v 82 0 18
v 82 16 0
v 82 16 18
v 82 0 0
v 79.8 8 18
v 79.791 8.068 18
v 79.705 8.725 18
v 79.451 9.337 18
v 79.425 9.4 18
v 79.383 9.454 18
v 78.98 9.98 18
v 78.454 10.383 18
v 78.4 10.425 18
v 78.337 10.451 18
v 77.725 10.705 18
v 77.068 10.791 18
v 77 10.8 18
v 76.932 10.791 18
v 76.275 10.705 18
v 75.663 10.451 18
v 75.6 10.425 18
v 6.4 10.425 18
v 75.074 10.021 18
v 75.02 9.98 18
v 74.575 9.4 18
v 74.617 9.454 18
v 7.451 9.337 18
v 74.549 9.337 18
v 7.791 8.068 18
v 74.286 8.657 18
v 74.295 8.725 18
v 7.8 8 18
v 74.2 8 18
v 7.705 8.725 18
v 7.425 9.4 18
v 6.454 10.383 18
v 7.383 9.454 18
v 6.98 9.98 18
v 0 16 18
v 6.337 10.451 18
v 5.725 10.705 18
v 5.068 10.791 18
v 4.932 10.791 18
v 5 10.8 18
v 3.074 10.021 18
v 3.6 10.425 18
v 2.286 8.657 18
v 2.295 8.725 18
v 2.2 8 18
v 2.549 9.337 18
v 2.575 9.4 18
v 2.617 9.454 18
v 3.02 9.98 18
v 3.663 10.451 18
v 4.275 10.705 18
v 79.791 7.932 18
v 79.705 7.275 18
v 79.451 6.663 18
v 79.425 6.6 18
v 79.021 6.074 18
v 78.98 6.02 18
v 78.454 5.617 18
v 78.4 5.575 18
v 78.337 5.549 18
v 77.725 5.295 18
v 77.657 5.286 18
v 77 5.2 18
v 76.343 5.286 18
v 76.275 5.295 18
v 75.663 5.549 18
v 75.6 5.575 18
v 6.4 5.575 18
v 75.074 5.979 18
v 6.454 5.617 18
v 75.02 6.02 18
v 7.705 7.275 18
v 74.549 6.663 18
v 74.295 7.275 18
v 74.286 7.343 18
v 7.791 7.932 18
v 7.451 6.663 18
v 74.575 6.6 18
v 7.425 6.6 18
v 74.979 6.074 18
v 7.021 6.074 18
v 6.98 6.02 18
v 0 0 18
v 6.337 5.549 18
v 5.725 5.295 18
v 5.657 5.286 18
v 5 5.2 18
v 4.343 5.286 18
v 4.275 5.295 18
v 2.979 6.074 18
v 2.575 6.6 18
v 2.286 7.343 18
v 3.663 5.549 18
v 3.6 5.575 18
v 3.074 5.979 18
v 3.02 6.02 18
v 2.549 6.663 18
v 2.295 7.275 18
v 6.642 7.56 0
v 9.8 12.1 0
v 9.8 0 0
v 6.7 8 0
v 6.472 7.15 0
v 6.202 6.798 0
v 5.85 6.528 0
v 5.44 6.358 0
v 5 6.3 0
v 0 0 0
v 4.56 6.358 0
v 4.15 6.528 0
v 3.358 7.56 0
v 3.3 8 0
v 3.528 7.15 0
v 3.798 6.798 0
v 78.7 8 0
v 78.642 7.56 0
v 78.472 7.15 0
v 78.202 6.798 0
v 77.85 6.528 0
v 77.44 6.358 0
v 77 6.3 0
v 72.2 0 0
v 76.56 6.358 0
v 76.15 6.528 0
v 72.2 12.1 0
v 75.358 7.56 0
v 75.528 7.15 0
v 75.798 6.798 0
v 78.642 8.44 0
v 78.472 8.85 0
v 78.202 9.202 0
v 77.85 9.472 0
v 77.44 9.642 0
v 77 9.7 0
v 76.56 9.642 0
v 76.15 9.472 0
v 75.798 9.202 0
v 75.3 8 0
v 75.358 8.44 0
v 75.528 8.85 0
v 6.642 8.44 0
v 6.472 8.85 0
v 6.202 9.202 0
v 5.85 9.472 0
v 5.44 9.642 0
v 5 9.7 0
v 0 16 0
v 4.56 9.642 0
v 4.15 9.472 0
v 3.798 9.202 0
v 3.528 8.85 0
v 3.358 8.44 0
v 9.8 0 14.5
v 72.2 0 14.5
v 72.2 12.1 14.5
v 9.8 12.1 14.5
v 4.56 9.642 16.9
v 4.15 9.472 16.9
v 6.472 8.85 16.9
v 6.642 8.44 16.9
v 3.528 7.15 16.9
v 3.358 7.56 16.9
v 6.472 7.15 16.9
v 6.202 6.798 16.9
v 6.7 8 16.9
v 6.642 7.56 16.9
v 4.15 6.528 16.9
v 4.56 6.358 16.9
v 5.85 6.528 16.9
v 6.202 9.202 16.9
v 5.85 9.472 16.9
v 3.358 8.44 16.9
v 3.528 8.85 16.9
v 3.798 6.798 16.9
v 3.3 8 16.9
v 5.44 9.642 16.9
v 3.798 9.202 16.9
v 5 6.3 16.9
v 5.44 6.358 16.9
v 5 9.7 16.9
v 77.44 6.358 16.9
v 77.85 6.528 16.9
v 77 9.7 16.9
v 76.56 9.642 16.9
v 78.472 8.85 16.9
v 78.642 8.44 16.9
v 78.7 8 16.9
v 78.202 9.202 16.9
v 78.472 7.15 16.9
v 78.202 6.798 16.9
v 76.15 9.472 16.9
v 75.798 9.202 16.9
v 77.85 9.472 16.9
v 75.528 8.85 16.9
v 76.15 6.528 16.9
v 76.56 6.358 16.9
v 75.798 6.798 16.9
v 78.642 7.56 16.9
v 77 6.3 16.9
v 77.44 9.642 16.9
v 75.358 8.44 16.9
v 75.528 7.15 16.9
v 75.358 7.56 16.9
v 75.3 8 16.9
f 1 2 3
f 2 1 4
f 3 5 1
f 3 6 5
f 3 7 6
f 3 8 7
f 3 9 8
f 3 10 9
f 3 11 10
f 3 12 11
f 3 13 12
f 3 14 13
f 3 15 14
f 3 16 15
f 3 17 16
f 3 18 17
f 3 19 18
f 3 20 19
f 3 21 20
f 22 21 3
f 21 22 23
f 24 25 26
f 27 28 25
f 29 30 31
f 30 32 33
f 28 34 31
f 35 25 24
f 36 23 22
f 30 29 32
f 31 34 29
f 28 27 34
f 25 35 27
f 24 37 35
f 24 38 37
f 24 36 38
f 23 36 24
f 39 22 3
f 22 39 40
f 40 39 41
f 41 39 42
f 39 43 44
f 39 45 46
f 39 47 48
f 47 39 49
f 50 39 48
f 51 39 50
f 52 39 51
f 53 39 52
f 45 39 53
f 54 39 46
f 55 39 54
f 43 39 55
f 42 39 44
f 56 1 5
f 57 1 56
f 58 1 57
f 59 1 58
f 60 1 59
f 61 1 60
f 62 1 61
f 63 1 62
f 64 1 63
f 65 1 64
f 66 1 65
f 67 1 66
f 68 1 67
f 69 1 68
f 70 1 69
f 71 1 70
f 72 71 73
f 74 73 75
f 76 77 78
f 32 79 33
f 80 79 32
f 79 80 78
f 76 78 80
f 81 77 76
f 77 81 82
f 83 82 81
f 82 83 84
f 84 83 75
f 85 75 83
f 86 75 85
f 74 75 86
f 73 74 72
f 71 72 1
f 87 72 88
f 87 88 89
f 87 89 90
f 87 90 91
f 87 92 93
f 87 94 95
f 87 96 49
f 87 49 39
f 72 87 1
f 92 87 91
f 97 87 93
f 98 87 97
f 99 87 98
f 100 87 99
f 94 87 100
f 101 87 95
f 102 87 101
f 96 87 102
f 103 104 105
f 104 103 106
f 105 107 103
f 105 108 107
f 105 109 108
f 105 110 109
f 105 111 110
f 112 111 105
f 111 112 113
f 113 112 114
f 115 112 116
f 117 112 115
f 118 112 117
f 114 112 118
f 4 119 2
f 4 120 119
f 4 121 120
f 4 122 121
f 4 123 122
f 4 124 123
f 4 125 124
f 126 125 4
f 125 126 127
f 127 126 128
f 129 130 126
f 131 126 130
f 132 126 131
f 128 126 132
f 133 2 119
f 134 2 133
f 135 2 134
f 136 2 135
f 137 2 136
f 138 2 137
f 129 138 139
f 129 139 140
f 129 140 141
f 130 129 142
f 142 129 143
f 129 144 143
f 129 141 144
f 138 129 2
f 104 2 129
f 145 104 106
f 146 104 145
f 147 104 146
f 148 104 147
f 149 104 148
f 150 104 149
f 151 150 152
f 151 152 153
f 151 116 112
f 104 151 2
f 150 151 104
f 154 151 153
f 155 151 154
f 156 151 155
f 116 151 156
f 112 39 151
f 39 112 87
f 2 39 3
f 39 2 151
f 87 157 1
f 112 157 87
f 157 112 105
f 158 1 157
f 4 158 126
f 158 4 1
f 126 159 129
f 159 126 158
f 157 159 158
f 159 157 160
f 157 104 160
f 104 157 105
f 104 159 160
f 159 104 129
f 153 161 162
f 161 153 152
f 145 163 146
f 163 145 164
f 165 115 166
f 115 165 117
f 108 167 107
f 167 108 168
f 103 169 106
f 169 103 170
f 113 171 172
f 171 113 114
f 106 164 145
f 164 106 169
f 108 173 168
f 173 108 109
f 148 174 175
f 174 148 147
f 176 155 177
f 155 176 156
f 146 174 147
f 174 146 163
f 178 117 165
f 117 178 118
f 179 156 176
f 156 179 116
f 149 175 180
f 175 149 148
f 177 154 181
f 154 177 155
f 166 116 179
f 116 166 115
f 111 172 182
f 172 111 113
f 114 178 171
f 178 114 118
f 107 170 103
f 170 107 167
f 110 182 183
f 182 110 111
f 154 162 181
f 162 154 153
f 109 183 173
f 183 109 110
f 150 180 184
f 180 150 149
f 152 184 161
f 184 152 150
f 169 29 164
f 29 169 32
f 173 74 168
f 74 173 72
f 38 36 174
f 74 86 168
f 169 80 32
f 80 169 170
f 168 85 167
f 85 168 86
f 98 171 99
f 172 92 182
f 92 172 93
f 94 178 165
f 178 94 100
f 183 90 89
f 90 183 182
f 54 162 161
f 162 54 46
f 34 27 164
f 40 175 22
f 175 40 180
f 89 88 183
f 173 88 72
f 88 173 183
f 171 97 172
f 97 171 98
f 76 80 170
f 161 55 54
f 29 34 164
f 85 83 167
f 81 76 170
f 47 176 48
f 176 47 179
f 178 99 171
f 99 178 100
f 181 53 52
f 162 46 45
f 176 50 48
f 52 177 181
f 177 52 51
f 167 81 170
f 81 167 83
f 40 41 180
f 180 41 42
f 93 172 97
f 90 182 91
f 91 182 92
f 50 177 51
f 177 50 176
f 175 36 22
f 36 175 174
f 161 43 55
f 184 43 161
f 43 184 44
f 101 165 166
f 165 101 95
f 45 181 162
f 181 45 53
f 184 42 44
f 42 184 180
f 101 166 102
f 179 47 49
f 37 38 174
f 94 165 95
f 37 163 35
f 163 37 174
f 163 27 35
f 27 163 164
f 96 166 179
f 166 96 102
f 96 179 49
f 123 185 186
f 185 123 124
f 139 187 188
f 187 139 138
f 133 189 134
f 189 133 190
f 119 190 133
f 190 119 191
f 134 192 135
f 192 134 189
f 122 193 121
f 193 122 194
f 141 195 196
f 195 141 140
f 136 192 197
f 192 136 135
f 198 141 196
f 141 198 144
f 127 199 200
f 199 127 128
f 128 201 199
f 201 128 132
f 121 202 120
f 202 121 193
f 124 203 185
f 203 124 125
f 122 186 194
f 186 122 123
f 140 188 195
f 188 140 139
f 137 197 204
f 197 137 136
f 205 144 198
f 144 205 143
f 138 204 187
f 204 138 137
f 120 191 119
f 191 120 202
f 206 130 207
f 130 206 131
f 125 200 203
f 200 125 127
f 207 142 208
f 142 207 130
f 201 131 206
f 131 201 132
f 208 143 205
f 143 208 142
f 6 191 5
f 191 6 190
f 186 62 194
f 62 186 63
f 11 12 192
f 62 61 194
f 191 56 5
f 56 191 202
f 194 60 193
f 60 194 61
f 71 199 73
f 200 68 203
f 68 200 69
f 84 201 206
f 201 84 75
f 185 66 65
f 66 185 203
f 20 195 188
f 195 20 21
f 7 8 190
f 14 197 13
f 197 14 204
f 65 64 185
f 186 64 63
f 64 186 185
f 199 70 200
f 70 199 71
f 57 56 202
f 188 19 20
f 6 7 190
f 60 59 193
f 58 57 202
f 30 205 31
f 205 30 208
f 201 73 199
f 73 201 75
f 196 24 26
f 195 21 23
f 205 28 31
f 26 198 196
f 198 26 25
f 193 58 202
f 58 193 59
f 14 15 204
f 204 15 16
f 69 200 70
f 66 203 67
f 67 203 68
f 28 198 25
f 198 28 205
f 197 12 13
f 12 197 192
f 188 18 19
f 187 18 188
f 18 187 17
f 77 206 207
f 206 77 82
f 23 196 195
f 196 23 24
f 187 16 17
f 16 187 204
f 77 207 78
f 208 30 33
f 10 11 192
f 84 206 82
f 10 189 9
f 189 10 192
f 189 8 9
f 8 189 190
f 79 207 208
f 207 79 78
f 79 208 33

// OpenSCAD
// USB hub holder 3D Design

// Copyright (c) 2014 by Jeremy Bennett <jeremy.bennett@embecosm.com>

// Licensed under a Creative Commons Attribution-ShareAlike 3.0 Unported
// License.

// You should have received a copy of the license along with this work.  If not,
// see <http://creativecommons.org/licenses/by-sa/3.0/>.

// -----------------------------------------------------------------------------

// The main block
module main_block () {
	union () {
 		translate (v = [0, 0, 5])
			cube (size = [18, 6, 10], center = true);
		translate (v = [18 / 2, 0, 13 / 2])
			cylinder (r = 3, h = 13, center = true, $fn = 24);
 		translate (v = [-18 / 2, 0, 13 / 2])
			cylinder (r = 3, h = 13, center = true, $fn = 24);
	}
}


// The holder
module usb_holder () {
	difference () {
		// The main support
		translate (v = [82 / 2, 16 / 2, 18 / 2])
			cube (size = [82, 16, 18], center = true);
		// Slot for the hub
		translate (v = [62.4 / 2 + 9.8, 12 / 2, 14.4 / 2])
			cube (size = [62.4, 12.2, 14.6], center = true);
		// Screw hole
		translate (v = [5, 8, 18.2 / 2])
			cylinder (r = 1.7, h = 18.2, center = true, $fn = 24);
		// Screw countersink
		translate (v = [5, 8, 18.2 - 1.3 / 2])
			cylinder (r1 = 1.7, r2 = 3, h = 1.3, center = true, $fn = 24);
		// Screw hole
		translate (v = [77, 8, 18.2 / 2])
			cylinder (r = 1.7, h = 18.2, center = true, $fn = 24);
		// Screw countersink
		translate (v = [77, 8, 18.2 - 1.3 / 2])
			cylinder (r1 = 1.7, r2 = 3, h = 1.3, center = true, $fn = 24);
	}
}

usb_holder ();
